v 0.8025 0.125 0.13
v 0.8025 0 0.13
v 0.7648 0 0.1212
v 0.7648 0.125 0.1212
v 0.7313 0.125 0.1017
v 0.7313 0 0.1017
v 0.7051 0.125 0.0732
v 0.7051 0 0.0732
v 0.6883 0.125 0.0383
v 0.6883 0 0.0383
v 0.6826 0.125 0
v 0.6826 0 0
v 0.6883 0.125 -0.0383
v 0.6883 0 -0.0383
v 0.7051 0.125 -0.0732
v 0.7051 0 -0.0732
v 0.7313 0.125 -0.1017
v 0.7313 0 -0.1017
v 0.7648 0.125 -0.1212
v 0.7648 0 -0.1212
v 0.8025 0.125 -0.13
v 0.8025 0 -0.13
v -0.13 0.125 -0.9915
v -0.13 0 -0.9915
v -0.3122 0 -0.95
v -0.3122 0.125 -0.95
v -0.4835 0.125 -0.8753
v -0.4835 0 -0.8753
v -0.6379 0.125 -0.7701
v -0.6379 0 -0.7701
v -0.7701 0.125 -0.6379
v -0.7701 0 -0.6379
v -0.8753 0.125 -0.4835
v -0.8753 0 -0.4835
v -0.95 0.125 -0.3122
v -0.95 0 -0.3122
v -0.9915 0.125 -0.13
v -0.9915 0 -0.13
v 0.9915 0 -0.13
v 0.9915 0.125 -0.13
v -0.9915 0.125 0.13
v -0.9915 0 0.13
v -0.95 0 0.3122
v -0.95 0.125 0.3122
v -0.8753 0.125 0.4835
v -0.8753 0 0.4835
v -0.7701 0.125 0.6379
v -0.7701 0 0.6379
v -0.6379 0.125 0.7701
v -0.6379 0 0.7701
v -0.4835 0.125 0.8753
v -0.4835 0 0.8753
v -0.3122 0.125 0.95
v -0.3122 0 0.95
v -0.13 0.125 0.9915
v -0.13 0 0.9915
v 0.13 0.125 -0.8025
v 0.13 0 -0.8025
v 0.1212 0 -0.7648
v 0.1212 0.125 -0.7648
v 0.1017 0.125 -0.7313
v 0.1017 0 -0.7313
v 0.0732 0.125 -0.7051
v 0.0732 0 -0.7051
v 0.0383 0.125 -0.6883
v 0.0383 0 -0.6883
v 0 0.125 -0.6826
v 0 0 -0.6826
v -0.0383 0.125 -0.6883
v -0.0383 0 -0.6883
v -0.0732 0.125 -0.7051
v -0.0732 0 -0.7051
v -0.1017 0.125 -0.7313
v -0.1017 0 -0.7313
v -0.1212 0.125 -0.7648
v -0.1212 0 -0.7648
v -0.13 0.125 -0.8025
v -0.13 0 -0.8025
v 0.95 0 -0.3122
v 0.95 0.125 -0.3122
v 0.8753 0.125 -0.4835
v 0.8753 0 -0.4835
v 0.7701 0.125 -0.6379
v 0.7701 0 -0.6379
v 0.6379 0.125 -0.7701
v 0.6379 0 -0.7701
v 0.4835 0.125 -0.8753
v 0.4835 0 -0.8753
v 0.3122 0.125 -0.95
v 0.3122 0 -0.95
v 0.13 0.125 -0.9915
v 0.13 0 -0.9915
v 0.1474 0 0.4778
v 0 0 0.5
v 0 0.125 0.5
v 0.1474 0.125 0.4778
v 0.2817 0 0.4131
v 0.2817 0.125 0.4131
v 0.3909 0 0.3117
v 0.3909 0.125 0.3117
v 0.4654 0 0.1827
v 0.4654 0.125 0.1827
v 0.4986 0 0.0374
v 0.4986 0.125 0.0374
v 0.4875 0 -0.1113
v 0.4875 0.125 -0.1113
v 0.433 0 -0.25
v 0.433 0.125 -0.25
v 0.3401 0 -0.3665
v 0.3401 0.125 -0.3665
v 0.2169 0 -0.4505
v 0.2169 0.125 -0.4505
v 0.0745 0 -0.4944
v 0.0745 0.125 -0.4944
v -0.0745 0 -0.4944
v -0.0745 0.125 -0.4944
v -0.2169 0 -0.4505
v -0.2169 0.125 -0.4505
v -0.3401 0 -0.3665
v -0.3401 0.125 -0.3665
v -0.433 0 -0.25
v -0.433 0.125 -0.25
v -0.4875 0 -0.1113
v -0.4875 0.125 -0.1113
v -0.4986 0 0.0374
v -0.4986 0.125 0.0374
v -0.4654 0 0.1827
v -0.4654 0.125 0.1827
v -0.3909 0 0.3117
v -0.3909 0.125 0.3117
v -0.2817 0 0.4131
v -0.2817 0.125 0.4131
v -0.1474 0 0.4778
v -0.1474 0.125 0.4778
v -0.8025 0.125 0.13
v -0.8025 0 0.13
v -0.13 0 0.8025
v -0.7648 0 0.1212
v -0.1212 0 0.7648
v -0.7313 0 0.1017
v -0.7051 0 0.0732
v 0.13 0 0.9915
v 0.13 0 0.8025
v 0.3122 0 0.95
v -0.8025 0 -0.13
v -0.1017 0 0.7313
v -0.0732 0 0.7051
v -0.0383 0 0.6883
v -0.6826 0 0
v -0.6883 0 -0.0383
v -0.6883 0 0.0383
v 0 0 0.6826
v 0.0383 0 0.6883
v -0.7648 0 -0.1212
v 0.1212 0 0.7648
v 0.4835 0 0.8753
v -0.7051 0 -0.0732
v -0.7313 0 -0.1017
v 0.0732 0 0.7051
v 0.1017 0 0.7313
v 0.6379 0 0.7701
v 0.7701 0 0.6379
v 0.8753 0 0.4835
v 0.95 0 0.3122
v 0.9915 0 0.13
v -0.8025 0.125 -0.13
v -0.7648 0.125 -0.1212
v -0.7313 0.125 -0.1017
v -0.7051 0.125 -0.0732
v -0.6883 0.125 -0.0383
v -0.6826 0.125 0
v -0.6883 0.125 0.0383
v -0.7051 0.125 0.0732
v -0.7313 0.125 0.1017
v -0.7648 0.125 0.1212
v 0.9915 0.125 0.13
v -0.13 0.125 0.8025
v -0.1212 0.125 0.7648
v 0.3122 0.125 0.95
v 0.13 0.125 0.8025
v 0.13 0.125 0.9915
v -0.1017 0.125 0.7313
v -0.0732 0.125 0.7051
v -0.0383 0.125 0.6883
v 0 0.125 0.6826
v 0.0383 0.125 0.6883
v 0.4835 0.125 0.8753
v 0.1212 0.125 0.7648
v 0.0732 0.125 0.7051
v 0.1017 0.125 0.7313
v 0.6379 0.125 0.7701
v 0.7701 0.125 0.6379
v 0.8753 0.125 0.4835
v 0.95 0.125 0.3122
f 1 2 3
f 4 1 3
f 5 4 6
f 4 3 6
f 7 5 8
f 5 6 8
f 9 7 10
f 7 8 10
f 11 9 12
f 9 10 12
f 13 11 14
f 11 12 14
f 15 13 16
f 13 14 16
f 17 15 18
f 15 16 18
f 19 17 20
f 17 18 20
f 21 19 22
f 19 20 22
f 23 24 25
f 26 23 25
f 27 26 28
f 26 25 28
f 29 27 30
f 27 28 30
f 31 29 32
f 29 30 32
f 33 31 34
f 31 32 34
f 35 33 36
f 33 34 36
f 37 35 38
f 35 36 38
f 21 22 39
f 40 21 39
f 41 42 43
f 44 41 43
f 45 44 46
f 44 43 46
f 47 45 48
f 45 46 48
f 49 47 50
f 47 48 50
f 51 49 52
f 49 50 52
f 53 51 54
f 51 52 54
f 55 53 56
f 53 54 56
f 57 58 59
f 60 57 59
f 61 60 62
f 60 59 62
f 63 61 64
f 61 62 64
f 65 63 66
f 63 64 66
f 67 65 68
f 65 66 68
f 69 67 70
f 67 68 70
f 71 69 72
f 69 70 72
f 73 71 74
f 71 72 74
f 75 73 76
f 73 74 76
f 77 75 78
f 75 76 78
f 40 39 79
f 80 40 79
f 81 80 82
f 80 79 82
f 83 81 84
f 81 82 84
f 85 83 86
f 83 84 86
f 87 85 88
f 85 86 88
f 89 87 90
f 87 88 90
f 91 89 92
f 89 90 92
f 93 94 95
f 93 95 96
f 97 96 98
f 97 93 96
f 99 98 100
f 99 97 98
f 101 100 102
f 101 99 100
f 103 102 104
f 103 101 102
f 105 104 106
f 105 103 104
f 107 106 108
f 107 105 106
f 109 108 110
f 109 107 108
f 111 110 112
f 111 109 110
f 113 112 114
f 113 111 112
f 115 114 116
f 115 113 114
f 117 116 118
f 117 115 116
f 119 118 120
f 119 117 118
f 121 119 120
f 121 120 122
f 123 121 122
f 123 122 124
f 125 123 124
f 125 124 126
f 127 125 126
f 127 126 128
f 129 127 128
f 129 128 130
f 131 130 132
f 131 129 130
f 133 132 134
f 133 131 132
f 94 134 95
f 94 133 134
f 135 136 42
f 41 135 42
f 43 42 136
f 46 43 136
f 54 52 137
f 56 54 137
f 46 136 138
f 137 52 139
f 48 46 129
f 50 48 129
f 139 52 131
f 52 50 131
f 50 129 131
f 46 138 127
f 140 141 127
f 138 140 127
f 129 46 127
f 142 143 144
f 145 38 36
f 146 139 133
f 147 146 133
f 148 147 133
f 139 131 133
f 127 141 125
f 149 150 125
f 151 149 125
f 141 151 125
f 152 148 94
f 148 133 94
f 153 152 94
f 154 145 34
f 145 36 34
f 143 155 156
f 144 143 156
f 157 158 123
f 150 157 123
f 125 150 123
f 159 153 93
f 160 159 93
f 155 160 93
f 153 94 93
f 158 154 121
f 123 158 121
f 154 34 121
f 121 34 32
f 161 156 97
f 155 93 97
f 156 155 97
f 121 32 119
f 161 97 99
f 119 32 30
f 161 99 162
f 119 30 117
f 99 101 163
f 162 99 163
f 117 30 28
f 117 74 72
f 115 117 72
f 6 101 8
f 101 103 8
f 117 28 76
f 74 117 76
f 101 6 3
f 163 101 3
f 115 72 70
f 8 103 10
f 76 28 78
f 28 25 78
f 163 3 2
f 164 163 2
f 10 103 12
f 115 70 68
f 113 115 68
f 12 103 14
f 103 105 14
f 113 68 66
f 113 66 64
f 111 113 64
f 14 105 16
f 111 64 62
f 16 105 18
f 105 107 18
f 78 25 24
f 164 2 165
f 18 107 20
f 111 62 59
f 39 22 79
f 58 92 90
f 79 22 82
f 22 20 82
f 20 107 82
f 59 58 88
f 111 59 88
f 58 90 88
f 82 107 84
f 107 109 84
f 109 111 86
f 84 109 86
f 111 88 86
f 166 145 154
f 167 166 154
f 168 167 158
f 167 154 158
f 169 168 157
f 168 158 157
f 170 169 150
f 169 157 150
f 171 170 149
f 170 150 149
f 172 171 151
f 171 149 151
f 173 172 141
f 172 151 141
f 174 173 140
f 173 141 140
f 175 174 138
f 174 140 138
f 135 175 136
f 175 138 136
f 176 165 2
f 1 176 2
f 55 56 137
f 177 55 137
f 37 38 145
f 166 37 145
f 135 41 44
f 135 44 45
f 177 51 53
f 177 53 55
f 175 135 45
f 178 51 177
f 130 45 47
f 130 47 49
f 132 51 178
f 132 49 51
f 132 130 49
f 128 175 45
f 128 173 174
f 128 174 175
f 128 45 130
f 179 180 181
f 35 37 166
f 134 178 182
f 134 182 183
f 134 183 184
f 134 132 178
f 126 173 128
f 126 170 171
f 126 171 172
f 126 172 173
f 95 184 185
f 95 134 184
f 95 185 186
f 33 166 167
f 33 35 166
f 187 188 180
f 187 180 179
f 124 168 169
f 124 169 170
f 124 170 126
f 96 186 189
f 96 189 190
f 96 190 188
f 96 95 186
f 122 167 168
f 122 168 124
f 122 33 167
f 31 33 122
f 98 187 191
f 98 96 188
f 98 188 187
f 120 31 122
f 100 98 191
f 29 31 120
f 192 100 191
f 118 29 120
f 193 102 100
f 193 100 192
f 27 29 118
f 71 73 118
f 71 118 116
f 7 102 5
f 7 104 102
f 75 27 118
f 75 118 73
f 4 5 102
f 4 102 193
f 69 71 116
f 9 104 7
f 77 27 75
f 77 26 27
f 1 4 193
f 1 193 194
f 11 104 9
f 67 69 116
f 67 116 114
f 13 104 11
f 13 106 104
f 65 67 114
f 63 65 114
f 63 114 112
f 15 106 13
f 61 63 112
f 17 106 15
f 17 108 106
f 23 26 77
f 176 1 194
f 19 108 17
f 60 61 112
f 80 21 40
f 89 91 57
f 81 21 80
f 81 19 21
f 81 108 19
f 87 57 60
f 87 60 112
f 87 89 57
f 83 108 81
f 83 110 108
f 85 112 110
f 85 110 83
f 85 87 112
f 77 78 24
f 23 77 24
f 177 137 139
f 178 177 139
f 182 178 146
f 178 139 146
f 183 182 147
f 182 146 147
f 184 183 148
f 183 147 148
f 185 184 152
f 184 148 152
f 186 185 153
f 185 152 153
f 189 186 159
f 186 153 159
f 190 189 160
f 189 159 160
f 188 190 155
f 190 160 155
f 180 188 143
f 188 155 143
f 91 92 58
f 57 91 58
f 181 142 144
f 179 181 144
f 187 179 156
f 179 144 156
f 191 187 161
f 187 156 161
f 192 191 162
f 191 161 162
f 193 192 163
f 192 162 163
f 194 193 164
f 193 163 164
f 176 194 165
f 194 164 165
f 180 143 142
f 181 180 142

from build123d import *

# Parameters (mm, degrees)
SKETCH1_R           = 0.5
BOSS_EXTRUDE1_DEPTH = 0.125


with BuildPart() as part:
    # Sketch1 → Boss-Extrude1 (new body)
    with BuildSketch(Plane(origin=(0, 0, 0), x_dir=(1, 0, 0), z_dir=(0, 1, 0))):
        with BuildLine():
            Line((0.13, 0.991513994), (0.13, 0.802539096))
            ThreePointArc((0.13, 0.802539096), (0, 0.682579793), (-0.13, 0.802539096))
            Line((-0.13, 0.802539096), (-0.13, 0.991513994))
            ThreePointArc((-0.13, 0.991513994), (-0.707106781, 0.707106781), (-0.991513994, 0.13))
            Line((-0.991513994, 0.13), (-0.802539096, 0.13))
            ThreePointArc((-0.802539096, 0.13), (-0.682579793, 0), (-0.802539096, -0.13))
            Line((-0.802539096, -0.13), (-0.991513994, -0.13))
            ThreePointArc((-0.991513994, -0.13), (-0.707106781, -0.707106781), (-0.13, -0.991513994))
            Line((-0.13, -0.991513994), (-0.13, -0.802539096))
            ThreePointArc((-0.13, -0.802539096), (0, -0.682579793), (0.13, -0.802539096))
            Line((0.13, -0.802539096), (0.13, -0.991513994))
            ThreePointArc((0.13, -0.991513994), (0.707106781, -0.707106781), (0.991513994, -0.13))
            Line((0.991513994, -0.13), (0.802539096, -0.13))
            ThreePointArc((0.802539096, -0.13), (0.682579793, 0), (0.802539096, 0.13))
            Line((0.802539096, 0.13), (0.991513994, 0.13))
            ThreePointArc((0.991513994, 0.13), (0.707106781, 0.707106781), (0.13, 0.991513994))
        make_face()
        with Locations(Location((0, 0, 0), (0, 0, 270))):
            Circle(SKETCH1_R, mode=Mode.SUBTRACT)
    extrude(amount=BOSS_EXTRUDE1_DEPTH)


solid = part.part
